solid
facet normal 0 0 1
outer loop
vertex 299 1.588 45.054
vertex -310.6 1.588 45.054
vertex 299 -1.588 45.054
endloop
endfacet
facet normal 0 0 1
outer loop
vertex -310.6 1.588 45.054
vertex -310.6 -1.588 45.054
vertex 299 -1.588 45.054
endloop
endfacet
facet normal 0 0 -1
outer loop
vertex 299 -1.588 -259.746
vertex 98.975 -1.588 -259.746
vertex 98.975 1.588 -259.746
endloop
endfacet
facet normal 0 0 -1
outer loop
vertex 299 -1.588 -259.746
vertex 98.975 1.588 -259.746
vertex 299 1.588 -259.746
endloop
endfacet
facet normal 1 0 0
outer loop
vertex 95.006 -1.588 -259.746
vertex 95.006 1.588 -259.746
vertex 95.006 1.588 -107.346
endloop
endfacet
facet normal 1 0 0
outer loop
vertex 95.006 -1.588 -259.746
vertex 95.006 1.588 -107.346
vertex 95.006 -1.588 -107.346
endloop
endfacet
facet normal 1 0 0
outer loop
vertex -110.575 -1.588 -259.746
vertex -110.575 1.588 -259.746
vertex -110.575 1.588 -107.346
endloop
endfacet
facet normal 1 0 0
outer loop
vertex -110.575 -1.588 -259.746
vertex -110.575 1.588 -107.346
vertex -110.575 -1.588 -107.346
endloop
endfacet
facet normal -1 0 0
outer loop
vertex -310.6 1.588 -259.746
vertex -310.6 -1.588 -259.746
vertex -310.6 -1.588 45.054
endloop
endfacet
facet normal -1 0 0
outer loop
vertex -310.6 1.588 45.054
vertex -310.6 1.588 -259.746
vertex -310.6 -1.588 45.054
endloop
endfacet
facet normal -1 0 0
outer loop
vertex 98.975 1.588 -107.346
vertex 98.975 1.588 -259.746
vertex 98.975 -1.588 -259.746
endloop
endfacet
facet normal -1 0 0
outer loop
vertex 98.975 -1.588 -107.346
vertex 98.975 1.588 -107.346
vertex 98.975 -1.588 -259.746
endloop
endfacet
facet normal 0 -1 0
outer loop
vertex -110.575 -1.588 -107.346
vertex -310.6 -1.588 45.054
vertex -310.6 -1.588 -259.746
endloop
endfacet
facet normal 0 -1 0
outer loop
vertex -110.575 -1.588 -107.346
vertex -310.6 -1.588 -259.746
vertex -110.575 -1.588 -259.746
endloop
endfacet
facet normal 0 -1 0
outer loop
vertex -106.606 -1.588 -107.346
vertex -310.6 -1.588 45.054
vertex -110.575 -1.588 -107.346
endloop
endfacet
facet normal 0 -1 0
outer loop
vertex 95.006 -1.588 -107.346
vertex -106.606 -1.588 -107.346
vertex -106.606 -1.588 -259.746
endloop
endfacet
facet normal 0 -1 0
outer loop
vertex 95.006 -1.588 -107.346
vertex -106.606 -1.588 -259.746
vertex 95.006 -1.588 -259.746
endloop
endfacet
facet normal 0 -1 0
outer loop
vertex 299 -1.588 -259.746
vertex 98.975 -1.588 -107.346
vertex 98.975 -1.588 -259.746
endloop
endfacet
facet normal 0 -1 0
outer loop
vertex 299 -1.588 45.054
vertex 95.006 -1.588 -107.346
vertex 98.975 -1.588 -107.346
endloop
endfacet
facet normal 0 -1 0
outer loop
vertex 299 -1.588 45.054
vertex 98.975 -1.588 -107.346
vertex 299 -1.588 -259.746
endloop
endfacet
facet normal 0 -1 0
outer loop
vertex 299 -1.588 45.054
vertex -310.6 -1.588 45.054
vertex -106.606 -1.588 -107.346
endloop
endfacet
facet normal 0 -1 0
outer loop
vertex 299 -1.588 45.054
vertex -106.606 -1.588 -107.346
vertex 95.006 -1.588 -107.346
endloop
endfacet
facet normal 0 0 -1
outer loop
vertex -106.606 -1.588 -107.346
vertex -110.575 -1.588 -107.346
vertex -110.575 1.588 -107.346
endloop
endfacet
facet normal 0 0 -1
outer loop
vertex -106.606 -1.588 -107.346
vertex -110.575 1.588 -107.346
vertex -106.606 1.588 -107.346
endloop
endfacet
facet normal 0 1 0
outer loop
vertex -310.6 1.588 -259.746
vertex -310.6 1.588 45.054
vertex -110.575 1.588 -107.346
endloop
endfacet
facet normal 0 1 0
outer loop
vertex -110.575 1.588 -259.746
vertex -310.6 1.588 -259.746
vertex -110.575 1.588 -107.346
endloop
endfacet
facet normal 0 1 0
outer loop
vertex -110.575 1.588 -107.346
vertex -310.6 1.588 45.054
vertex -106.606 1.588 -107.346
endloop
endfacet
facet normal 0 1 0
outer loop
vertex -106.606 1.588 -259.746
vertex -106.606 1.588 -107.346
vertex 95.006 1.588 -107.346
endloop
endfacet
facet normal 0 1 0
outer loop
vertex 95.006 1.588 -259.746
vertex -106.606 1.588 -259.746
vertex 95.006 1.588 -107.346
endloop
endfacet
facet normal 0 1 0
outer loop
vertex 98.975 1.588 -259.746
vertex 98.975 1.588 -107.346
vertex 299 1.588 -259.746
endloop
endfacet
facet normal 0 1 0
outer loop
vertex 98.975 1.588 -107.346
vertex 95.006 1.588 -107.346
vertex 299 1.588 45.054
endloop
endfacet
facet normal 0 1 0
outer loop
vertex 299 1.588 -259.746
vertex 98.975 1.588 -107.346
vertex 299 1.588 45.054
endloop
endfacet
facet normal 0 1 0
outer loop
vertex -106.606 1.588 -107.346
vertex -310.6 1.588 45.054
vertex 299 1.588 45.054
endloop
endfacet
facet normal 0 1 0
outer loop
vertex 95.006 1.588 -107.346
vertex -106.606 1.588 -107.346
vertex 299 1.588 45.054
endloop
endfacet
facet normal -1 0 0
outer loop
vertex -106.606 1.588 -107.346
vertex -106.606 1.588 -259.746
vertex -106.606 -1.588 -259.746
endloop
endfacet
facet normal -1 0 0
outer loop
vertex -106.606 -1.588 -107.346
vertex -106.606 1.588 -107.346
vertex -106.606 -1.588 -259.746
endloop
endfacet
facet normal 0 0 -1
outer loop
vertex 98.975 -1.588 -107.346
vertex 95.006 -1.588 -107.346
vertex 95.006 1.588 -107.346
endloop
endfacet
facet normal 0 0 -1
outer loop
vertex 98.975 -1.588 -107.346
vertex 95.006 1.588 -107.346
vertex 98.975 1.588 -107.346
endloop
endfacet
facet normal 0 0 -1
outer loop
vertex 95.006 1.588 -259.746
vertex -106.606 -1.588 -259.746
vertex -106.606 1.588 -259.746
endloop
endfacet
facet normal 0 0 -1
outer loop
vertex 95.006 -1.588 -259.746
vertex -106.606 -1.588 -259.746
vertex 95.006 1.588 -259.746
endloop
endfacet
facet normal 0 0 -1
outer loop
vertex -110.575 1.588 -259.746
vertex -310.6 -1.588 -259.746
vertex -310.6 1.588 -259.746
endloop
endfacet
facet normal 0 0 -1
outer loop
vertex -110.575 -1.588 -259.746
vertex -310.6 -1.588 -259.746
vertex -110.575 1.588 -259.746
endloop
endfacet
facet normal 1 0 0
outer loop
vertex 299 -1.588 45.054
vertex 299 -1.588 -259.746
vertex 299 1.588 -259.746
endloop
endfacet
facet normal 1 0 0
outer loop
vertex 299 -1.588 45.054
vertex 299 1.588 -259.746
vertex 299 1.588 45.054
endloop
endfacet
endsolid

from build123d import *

# Parameters (mm, degrees)
F0_W     = 609.6
F0_H     = 304.8
F1_DEPTH = 1.5875
F2_W     = 3.96875
F2_H     = 3.175
F3_DEPTH = 152.4
F4_W     = 3.96875
F4_H     = 3.175
F5_DEPTH = 152.4


with BuildPart() as f1:
    # F0 (on Front) → F1 (new body, symmetric)
    with BuildSketch(Plane.XZ):
        with Locations((-5.80007, -107.346192)):
            Rectangle(F0_W, F0_H)
    extrude(amount=F1_DEPTH, both=True)

    # F2 (on face) → F3 (cut)
    with BuildSketch(Plane(origin=(0, 0, -259.746192), x_dir=(1, 0, 0), z_dir=(0, 0, -1))):
        with Locations((96.990555, 0)):
            Rectangle(F2_W, F2_H)
    extrude(amount=-F3_DEPTH, mode=Mode.SUBTRACT)

    # F4 (on face) → F5 (cut)
    with BuildSketch(Plane(origin=(0, 0, -259.746192), x_dir=(1, 0, 0), z_dir=(0, 0, -1))):
        with Locations((-108.590695, 0)):
            Rectangle(F4_W, F4_H)
    extrude(amount=-F5_DEPTH, mode=Mode.SUBTRACT)


solid = f1.part
